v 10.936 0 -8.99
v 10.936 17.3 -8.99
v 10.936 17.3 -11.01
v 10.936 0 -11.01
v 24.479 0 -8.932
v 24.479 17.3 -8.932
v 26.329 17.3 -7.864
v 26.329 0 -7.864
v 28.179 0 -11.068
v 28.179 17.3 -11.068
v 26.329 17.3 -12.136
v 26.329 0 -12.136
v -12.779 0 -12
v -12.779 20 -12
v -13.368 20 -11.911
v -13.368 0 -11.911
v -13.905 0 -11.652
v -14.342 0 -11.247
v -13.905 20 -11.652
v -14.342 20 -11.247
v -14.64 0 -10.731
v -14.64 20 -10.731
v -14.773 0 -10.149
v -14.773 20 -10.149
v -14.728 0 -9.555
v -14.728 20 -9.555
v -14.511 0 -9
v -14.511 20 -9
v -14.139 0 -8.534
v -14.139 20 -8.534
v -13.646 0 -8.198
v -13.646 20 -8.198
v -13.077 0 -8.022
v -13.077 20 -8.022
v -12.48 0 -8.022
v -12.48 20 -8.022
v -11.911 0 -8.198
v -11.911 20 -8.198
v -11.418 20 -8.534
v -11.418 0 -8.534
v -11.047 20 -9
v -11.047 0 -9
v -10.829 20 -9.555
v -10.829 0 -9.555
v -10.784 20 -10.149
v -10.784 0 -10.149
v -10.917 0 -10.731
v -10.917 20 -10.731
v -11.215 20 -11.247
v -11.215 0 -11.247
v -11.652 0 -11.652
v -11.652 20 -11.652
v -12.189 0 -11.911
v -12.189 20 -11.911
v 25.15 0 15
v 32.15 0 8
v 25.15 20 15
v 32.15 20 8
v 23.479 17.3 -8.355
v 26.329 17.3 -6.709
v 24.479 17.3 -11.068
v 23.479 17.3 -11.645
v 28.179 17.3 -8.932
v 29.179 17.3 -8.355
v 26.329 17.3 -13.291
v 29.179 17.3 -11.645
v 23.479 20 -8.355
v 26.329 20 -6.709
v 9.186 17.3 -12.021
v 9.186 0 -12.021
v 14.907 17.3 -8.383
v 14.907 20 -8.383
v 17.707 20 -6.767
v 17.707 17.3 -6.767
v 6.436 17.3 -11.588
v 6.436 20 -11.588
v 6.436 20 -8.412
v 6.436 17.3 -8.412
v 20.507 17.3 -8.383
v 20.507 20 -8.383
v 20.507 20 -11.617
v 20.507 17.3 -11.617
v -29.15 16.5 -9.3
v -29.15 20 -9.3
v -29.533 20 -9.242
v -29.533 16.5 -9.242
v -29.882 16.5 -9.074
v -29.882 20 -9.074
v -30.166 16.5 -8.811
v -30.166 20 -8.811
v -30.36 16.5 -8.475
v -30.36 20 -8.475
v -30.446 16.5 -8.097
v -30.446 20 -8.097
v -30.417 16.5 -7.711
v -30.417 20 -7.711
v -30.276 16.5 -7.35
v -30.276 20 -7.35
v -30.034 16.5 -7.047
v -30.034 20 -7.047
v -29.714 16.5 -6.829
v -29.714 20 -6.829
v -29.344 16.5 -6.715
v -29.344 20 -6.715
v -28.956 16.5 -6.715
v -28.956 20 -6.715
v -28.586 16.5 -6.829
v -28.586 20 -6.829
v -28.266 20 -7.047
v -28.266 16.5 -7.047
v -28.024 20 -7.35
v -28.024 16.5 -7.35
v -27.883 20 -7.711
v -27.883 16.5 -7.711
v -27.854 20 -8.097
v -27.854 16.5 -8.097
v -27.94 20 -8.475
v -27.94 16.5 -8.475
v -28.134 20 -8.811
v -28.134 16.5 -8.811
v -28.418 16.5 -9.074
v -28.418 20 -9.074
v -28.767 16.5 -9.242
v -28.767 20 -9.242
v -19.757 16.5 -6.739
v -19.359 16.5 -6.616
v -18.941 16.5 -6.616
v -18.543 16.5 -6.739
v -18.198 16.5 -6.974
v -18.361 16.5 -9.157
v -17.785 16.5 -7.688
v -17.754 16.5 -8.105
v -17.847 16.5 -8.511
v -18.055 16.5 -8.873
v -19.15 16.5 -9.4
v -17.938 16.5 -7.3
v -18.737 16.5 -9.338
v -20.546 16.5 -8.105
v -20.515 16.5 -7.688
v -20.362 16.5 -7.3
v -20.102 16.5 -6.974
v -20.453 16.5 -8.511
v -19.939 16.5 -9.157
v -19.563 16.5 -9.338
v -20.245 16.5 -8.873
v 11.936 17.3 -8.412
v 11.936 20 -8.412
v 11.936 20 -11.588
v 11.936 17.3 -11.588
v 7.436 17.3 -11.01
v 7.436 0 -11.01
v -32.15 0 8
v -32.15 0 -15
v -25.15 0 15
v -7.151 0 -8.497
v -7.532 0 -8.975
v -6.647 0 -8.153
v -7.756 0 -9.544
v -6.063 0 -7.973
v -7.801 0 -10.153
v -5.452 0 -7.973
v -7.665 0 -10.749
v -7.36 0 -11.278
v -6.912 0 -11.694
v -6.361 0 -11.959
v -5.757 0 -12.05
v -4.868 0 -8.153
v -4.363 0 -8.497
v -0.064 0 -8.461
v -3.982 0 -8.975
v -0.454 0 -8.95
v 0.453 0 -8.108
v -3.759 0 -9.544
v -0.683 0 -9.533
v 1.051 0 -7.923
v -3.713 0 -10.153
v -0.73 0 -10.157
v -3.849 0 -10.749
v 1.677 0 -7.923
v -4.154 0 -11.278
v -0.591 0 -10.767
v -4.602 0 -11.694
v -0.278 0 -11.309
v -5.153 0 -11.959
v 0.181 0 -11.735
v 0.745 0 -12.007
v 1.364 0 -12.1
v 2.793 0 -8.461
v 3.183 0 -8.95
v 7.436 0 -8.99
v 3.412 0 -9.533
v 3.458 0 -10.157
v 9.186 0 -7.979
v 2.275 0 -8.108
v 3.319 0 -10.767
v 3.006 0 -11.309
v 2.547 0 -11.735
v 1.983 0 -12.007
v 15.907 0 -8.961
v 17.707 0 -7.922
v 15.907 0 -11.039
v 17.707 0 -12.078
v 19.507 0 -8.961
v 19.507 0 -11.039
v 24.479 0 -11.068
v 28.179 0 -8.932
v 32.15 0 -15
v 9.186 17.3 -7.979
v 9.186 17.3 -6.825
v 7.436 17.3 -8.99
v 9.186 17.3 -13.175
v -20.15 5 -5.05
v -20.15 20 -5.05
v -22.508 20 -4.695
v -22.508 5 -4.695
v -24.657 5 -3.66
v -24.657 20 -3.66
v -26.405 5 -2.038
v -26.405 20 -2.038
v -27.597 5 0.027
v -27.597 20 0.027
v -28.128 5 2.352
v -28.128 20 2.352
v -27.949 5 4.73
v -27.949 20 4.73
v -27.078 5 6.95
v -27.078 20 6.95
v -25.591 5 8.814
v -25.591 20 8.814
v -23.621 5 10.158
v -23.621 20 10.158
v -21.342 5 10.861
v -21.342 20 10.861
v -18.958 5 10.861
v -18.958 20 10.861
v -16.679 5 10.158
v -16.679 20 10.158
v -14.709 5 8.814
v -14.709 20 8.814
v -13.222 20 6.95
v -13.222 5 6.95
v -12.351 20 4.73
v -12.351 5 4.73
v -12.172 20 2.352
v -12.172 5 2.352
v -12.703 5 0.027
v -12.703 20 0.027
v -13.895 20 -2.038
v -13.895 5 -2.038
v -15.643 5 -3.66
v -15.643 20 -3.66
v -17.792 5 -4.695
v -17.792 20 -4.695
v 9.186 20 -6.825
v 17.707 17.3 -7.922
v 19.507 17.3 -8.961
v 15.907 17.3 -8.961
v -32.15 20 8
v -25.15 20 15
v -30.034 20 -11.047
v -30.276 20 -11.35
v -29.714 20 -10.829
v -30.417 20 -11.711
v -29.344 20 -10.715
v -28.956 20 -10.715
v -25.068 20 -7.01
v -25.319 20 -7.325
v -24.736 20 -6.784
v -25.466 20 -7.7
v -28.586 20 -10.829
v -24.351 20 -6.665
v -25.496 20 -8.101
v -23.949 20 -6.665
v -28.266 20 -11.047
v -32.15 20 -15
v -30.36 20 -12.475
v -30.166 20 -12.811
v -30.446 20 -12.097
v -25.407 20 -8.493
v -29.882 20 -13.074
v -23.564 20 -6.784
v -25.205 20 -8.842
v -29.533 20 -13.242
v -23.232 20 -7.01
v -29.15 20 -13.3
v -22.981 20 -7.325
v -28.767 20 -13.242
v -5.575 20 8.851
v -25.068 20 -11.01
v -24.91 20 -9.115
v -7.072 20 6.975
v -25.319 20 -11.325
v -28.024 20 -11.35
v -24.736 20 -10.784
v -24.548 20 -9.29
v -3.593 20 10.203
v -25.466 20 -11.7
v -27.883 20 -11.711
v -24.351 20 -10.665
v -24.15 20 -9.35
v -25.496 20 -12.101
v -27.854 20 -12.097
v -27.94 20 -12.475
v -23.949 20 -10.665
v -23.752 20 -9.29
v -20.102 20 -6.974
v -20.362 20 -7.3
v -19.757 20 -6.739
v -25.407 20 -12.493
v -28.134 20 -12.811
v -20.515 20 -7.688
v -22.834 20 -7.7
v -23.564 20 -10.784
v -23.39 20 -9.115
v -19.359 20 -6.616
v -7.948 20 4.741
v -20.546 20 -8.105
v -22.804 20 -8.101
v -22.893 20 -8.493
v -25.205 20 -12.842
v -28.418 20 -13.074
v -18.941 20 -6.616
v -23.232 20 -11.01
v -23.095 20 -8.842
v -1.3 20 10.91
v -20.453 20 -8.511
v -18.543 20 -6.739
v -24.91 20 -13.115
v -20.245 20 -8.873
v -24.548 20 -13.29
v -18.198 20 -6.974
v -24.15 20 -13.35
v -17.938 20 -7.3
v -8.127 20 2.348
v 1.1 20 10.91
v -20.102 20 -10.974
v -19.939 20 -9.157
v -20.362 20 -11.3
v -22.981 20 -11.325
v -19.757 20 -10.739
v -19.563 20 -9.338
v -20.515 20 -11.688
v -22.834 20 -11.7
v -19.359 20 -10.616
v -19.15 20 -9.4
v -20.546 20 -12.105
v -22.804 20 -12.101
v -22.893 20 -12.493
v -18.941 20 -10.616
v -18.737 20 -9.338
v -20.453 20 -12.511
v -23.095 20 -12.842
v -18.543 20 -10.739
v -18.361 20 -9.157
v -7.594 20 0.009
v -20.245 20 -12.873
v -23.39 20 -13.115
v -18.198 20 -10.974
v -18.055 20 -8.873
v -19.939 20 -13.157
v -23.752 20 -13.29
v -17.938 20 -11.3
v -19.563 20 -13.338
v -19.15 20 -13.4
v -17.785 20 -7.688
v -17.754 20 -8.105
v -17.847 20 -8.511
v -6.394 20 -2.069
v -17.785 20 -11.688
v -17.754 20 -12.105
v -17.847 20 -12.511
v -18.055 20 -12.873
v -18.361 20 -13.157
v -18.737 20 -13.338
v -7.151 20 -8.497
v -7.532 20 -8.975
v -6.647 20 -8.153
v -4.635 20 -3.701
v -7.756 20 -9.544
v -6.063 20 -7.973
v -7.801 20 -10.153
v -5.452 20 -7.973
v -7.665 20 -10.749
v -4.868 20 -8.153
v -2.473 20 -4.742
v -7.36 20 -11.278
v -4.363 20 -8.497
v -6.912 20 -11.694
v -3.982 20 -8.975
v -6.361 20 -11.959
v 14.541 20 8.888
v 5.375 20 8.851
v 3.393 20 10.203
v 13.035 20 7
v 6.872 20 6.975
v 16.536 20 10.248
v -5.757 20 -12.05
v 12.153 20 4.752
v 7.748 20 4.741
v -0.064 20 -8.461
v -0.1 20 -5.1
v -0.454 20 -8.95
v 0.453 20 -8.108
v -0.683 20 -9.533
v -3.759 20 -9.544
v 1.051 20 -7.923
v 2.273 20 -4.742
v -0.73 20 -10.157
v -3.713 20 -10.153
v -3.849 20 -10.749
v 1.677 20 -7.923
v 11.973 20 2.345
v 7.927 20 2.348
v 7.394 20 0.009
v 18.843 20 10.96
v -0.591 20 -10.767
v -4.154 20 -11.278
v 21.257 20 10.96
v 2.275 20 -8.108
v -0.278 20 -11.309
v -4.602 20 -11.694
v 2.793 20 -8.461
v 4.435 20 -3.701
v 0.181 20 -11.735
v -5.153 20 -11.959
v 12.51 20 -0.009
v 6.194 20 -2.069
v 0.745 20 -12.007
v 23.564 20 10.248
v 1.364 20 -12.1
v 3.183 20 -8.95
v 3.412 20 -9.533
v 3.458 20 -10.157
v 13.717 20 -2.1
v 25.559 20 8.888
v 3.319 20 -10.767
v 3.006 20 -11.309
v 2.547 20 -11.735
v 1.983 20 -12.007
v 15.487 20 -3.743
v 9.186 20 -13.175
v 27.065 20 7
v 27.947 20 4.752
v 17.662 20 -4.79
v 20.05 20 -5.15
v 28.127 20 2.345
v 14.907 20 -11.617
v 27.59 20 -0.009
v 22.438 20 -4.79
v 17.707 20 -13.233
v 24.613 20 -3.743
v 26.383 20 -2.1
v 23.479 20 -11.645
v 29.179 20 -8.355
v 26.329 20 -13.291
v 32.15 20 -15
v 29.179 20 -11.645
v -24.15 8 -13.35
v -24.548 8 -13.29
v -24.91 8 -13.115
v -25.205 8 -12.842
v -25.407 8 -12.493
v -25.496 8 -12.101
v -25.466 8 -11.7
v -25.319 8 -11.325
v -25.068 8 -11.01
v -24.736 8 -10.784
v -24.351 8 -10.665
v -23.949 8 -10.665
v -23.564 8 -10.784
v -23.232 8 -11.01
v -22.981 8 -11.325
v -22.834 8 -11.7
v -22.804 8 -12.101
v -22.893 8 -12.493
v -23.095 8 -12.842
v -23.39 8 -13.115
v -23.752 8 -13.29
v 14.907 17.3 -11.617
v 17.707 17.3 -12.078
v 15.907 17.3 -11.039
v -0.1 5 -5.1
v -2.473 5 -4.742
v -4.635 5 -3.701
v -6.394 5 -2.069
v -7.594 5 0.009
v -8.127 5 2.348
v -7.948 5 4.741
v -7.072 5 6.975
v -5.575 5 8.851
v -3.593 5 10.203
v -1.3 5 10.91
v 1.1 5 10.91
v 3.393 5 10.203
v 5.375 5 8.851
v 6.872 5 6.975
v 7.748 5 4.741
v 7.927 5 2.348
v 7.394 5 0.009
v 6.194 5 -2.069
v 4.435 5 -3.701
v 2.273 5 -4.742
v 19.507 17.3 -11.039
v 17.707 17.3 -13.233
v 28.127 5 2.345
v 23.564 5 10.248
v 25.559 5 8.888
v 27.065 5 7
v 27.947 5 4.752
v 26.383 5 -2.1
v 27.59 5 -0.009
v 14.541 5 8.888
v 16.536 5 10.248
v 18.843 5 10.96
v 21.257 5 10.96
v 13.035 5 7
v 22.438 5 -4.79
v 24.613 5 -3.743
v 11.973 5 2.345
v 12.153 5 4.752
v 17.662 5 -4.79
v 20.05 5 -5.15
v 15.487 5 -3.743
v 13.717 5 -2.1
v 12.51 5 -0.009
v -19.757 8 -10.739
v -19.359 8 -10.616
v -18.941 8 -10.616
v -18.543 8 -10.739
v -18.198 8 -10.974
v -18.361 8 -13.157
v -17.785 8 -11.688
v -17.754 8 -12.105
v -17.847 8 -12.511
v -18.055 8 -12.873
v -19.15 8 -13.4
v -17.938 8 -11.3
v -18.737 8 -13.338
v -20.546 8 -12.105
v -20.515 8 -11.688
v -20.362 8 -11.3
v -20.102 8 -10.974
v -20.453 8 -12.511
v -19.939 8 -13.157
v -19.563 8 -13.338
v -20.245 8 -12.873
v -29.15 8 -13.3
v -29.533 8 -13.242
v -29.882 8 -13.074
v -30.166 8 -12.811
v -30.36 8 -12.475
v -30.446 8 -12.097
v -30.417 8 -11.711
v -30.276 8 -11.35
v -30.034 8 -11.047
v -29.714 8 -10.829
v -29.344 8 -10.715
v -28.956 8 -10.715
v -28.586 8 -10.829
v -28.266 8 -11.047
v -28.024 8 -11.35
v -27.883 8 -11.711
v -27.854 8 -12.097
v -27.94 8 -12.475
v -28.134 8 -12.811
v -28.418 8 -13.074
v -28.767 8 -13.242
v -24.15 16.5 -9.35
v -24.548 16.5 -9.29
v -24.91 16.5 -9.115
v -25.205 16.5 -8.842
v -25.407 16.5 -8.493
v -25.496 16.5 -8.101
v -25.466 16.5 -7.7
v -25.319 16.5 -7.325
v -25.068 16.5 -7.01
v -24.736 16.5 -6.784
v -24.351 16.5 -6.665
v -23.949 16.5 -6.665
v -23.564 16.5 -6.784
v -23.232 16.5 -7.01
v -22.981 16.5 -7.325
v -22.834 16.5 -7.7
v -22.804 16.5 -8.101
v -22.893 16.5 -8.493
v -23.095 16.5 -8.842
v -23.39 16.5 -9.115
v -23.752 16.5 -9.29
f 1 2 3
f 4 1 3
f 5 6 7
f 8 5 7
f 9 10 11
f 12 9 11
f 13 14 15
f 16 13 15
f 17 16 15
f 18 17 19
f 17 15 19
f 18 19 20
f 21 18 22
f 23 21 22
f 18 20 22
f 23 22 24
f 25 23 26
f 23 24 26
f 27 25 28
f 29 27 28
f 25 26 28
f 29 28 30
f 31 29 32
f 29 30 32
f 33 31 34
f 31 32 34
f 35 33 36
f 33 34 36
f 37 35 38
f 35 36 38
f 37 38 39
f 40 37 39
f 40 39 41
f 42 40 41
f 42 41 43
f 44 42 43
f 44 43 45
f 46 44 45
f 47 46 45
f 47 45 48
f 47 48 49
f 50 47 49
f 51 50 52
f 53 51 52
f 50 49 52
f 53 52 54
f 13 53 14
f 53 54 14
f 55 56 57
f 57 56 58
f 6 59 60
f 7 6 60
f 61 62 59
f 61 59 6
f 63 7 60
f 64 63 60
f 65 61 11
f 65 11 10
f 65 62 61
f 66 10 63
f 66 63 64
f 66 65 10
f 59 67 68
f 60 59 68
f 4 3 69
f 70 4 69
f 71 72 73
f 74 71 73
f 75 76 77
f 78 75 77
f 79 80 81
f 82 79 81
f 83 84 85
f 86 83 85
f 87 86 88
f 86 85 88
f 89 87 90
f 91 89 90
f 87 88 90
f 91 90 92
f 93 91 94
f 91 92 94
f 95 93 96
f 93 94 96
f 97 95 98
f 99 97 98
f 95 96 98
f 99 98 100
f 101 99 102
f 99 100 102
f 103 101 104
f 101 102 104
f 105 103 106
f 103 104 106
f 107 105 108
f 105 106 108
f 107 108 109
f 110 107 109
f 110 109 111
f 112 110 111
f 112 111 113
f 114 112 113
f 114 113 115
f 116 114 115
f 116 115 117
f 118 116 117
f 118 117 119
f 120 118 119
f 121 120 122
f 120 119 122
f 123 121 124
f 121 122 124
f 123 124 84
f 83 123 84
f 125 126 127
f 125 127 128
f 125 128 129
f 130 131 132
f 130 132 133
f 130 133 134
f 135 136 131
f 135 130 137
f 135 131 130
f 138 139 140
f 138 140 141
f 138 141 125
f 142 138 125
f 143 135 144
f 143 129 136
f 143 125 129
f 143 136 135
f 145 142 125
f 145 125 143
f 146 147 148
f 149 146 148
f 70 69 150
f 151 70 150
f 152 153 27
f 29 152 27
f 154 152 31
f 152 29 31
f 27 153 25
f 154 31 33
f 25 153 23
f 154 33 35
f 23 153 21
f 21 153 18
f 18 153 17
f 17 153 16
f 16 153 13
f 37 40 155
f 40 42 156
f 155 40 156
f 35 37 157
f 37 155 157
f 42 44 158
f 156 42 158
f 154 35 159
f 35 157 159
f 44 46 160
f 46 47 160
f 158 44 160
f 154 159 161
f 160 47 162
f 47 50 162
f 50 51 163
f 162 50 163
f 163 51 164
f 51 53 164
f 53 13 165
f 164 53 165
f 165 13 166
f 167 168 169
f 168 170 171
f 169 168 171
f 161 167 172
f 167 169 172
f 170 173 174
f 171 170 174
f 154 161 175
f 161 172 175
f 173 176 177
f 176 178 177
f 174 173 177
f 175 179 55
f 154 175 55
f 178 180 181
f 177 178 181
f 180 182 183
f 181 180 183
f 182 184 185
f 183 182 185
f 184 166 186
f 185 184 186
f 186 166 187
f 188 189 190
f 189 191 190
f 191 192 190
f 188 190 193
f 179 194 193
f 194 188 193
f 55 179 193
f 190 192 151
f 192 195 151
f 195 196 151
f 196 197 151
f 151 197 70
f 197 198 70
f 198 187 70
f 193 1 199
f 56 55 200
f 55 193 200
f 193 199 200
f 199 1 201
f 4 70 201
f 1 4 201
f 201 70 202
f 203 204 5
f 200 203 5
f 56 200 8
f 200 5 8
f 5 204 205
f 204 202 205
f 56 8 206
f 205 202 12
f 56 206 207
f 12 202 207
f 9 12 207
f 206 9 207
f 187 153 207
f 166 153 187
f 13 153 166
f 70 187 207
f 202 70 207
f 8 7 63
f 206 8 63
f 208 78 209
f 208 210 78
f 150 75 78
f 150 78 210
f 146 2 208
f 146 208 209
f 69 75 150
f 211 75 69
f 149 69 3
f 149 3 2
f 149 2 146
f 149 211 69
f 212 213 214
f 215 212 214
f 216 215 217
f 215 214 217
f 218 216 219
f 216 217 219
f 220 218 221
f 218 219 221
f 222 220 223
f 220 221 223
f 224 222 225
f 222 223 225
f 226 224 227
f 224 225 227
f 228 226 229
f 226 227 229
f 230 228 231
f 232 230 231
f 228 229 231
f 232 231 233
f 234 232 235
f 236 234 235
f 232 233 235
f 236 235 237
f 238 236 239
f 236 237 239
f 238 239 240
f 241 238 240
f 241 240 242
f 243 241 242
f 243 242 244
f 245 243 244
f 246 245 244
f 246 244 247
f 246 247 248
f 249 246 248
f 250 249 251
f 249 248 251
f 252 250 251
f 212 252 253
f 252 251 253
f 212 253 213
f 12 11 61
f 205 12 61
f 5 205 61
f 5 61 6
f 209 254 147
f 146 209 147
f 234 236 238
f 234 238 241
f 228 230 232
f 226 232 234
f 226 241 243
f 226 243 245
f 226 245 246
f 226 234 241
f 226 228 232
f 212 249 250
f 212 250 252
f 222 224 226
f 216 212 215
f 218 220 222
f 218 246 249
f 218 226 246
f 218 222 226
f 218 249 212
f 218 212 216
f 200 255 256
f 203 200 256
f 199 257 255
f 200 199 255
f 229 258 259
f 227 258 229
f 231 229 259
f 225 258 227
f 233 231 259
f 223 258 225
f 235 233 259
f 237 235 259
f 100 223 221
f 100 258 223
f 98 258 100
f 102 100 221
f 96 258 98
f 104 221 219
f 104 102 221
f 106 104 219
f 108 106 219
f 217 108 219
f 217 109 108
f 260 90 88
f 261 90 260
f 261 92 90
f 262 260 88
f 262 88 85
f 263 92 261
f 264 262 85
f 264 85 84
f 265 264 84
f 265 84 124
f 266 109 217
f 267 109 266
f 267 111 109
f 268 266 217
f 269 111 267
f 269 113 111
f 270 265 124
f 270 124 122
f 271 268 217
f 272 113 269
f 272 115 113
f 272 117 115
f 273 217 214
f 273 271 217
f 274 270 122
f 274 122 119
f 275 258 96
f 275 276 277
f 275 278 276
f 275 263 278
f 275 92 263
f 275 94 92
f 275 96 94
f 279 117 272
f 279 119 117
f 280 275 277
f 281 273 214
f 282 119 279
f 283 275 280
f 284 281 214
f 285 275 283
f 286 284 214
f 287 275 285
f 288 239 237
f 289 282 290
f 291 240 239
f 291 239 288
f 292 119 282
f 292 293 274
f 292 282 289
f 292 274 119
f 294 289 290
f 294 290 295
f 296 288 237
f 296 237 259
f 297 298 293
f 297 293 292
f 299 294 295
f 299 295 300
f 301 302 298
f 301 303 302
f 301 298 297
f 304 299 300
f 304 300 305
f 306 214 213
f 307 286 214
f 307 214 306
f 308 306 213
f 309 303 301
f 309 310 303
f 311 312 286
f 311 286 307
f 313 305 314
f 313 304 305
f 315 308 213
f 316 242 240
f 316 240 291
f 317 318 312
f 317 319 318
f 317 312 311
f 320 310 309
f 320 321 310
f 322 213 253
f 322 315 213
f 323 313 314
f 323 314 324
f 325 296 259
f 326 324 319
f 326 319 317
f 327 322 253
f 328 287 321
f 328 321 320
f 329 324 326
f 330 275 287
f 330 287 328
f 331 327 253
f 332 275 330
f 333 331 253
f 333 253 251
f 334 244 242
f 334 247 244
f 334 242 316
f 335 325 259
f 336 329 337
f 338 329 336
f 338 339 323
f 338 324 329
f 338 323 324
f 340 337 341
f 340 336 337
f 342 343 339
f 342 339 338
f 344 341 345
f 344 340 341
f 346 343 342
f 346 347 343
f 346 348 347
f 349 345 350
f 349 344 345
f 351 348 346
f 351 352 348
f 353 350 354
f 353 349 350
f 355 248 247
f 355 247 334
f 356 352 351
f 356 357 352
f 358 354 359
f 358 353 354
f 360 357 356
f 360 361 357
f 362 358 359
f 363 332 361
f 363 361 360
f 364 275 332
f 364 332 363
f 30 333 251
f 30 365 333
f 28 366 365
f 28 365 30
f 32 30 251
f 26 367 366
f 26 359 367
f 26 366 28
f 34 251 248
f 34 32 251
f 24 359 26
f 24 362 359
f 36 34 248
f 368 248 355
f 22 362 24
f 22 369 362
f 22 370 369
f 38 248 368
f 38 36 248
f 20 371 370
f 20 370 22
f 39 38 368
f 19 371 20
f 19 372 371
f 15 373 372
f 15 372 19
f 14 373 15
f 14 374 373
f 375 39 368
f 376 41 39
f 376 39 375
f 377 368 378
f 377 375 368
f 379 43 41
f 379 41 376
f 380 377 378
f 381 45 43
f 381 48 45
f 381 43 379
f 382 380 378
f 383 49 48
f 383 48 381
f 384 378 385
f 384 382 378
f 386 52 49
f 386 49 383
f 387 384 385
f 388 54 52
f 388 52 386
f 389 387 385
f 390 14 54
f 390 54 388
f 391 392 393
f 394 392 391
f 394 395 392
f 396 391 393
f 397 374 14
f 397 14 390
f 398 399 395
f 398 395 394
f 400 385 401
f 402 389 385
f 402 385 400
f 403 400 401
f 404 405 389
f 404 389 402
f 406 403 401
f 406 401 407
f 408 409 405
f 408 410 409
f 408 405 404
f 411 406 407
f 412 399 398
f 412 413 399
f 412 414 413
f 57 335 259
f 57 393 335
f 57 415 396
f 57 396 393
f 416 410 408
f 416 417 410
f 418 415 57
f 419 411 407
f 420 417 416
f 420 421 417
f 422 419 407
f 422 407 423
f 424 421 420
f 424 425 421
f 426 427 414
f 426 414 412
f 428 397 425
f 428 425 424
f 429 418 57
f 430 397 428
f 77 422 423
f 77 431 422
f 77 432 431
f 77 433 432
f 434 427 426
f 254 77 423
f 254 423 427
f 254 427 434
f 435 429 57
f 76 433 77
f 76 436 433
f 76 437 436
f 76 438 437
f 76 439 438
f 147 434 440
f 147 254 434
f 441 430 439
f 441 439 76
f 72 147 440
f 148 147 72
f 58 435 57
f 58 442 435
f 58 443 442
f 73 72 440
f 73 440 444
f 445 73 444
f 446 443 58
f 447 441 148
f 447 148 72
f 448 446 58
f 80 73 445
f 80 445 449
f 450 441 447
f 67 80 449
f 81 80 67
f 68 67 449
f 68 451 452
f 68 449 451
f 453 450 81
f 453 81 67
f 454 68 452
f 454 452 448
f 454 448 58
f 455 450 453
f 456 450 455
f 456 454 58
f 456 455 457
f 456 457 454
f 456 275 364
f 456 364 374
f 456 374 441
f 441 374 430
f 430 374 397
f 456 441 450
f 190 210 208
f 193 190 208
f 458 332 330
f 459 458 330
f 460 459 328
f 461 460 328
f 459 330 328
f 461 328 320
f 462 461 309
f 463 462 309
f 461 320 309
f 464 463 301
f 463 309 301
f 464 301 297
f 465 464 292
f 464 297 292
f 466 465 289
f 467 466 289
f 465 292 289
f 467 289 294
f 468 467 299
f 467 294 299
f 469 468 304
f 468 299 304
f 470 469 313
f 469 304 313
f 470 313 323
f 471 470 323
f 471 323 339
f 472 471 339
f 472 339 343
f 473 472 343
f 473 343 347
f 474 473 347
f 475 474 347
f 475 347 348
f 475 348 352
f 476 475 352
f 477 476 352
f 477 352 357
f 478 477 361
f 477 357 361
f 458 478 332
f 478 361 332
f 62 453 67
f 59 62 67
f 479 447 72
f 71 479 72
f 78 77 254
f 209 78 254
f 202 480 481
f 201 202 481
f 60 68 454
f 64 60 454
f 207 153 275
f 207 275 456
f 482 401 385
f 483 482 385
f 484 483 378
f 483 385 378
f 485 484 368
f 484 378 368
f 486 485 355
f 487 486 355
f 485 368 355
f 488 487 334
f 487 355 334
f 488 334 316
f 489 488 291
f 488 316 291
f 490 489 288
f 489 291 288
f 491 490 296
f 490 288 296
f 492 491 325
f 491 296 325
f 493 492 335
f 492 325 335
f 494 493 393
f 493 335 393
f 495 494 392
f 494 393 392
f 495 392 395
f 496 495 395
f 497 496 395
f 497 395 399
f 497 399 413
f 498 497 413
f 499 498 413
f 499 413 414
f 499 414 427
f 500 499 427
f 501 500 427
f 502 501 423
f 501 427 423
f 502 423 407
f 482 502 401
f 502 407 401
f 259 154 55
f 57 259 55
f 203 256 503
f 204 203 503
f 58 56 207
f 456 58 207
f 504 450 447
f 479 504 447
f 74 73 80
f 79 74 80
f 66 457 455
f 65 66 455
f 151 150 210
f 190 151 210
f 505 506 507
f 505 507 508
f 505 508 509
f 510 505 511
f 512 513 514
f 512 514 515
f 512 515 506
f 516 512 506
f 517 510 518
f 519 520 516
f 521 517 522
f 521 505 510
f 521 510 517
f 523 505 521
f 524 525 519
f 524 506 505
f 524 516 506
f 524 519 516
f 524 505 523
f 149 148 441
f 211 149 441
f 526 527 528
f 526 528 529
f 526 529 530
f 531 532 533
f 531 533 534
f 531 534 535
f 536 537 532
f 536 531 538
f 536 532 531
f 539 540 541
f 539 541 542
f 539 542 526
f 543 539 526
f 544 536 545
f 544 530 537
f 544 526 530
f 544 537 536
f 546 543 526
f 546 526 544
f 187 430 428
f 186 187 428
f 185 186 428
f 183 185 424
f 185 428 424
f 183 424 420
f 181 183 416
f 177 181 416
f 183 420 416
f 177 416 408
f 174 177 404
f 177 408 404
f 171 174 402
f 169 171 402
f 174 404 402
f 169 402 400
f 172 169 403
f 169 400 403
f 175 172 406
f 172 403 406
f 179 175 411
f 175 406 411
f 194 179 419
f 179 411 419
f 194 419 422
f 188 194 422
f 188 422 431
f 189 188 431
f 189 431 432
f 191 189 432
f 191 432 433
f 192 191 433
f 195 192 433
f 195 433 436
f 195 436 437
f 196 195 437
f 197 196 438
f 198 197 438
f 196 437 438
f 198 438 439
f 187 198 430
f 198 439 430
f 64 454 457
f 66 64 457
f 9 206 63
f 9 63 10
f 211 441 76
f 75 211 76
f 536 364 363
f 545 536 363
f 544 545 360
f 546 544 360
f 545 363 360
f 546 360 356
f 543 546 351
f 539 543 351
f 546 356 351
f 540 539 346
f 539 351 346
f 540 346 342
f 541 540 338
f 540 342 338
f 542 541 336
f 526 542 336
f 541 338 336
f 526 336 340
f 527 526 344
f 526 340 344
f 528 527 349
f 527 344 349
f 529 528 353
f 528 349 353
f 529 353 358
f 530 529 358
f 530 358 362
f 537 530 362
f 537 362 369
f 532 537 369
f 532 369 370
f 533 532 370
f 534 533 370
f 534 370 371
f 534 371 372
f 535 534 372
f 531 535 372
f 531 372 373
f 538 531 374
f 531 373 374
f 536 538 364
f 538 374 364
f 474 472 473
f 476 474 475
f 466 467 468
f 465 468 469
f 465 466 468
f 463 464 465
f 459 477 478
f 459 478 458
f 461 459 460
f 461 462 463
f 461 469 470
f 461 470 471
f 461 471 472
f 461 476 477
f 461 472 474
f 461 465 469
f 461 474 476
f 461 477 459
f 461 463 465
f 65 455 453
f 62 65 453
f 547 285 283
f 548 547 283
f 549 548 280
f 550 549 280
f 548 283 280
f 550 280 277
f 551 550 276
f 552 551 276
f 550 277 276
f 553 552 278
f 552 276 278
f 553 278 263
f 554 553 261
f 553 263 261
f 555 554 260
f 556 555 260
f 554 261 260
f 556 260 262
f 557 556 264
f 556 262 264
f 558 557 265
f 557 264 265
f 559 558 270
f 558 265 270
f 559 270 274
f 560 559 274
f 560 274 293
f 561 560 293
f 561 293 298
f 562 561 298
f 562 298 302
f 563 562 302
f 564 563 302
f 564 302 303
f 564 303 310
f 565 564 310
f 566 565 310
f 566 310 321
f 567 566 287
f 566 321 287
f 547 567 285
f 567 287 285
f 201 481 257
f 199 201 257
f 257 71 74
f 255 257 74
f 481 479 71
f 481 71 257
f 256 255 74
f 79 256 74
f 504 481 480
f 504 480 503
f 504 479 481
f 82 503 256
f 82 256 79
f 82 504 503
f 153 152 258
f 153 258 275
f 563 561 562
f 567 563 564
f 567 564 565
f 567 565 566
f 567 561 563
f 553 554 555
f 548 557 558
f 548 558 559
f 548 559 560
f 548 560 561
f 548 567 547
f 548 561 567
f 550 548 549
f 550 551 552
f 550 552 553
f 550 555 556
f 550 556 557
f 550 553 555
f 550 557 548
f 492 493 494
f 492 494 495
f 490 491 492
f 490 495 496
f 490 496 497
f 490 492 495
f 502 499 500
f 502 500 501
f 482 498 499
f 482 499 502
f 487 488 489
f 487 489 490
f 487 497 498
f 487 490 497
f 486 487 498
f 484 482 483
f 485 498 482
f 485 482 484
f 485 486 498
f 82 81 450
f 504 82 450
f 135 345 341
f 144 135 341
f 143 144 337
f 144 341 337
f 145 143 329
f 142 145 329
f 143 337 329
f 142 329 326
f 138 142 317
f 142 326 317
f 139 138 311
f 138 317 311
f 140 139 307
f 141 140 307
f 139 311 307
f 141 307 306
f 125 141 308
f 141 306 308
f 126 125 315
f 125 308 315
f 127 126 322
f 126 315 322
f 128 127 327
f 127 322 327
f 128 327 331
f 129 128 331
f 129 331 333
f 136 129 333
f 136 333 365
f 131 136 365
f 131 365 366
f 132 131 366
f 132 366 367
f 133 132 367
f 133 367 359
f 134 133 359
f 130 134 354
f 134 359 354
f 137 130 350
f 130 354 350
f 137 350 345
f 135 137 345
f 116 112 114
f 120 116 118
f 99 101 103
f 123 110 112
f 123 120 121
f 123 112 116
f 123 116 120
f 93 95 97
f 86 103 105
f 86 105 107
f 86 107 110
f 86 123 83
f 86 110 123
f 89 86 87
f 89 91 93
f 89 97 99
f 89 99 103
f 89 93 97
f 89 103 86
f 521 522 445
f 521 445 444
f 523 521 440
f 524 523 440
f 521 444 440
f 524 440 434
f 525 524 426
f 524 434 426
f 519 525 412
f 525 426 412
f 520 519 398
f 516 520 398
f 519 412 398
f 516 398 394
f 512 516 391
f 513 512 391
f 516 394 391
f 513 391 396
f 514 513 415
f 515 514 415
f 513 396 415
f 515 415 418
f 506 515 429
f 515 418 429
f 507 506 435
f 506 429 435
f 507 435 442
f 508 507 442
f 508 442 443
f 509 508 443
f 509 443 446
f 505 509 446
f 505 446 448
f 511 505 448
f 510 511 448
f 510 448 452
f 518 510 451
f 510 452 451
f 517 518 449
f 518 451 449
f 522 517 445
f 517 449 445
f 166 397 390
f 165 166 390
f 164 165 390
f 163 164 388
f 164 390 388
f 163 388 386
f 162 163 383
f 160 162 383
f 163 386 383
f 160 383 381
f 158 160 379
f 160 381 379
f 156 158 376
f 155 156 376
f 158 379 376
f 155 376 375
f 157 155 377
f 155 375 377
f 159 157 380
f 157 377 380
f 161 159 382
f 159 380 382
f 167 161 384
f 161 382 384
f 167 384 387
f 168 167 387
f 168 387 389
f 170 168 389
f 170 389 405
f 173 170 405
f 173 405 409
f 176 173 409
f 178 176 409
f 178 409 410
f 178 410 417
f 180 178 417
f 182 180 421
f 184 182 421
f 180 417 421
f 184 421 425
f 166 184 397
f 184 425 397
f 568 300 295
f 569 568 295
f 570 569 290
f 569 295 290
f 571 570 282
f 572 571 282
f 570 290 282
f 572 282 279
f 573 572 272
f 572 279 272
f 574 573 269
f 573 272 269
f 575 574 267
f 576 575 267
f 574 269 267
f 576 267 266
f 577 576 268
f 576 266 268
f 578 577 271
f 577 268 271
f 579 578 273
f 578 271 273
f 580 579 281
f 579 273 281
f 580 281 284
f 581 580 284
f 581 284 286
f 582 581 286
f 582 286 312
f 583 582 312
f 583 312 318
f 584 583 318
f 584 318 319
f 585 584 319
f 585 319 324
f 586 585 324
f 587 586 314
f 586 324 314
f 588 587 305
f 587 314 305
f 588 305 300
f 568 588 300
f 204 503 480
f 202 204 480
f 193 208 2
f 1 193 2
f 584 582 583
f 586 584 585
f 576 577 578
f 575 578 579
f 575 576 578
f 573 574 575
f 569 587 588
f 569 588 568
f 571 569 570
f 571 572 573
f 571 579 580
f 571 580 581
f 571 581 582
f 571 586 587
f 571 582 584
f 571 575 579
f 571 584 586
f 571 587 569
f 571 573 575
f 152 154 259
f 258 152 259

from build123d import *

# Parameters (mm, degrees)
SKETCH1_W             = 64.3
SKETCH1_H             = 30
BOSS_EXTRUDE1_DEPTH   = 20
VARILLAS_START        = 20
SKETCH1_3_R           = 8.05
SKETCH1_3_R_2         = 8.1
SKETCH1_3_R_3         = 8
VARILLAS_HUECAS_DEPTH = 15
TORNILLOS_START       = 20
SKETCH1_4_R           = 1.35
SKETCH1_4_R_2         = 1.4
SKETCH1_4_R_3         = 1.3
TORNILLOS_ALEM_DEPTH  = 12
TORNILLOS_PCB_DEPTH   = 2.7
SKETCH1_5_R           = 2
SKETCH1_5_R_2         = 2.05
SKETCH1_5_R_3         = 2.1
VARILLAS_SERVOS_DEPTH = 20
CHAMFER1_SIZE         = 7
CUT_EXTRUDE5_REACH    = 41.47
CUT_EXTRUDE6_START    = 20
SKETCH1_7_R           = 1.35
SKETCH1_7_R_2         = 1.3
SKETCH1_7_R_3         = 1.4
CUT_EXTRUDE6_DEPTH    = 3.5


with BuildPart() as part:
    # Sketch1 → Boss-Extrude1 (new body)
    with BuildSketch(Plane(origin=(0, 0, 0), x_dir=(1, 0, 0), z_dir=(0, 1, 0))):
        Rectangle(SKETCH1_W, SKETCH1_H)
    extrude(amount=BOSS_EXTRUDE1_DEPTH)

    # Sketch1<3> → Varillas huecas (cut)
    with BuildSketch(Plane(origin=(0, 0, 0), x_dir=(1, 0, 0), z_dir=(0, 1, 0)).offset(VARILLAS_START)):
        with Locations(Location((-0.1, -2.95, 0), (0, 0, 90))):
            Circle(SKETCH1_3_R)
        with Locations(Location((20.05, -2.95, 0), (0, 0, 90))):
            Circle(SKETCH1_3_R_2)
        with Locations(Location((-20.15, -2.95, 0), (0, 0, 90))):
            Circle(SKETCH1_3_R_3)
    extrude(amount=-VARILLAS_HUECAS_DEPTH, mode=Mode.SUBTRACT)

    # Sketch1<4> → Tornillos Alem (cut)
    with BuildSketch(Plane(origin=(0, 0, 0), x_dir=(1, 0, 0), z_dir=(0, 1, 0)).offset(TORNILLOS_START)):
        with Locations(Location((-24.15, 12, 0), (0, 0, 90))):
            Circle(SKETCH1_4_R)
        with Locations(Location((-19.15, 12, 0), (0, 0, 90))):
            Circle(SKETCH1_4_R_2)
        with Locations(Location((-29.15, 12, 0), (0, 0, 90))):
            Circle(SKETCH1_4_R_3)
    extrude(amount=-TORNILLOS_ALEM_DEPTH, mode=Mode.SUBTRACT)

    # Sketch1<6> → Tornillos PCB (cut)
    with BuildSketch(Plane(origin=(0, 0, 0), x_dir=(1, 0, 0), z_dir=(0, 1, 0)).offset(TORNILLOS_START)):
        Polygon((9.185714286, 6.824573519), (11.935714286, 8.41228676), (11.935714286, 11.58771324), (9.185714286, 13.175426481), (6.435714286, 11.58771324), (6.435714286, 8.41228676), align=None)
        Polygon((17.707142857, 6.766838493), (20.507142857, 8.383419246), (20.507142857, 11.616580754), (17.707142857, 13.233161507), (14.907142857, 11.616580754), (14.907142857, 8.383419246), align=None)
        Polygon((26.328571429, 6.709103466), (29.178571429, 8.354551733), (29.178571429, 11.645448267), (26.328571429, 13.290896534), (23.478571429, 11.645448267), (23.478571429, 8.354551733), align=None)
    extrude(amount=-TORNILLOS_PCB_DEPTH, mode=Mode.SUBTRACT)

    # Sketch1<5> → Varillas servos (cut)
    with BuildSketch(Plane(origin=(0, 0, 0), x_dir=(1, 0, 0), z_dir=(0, 1, 0)).offset(VARILLAS_START)):
        with Locations(Location((-12.778571429, 10, 0), (0, 0, 90))):
            Circle(SKETCH1_5_R)
        with Locations(Location((-5.757142857, 10, 0), (0, 0, 90))):
            Circle(SKETCH1_5_R_2)
        with Locations(Location((1.364285714, 10, 0), (0, 0, 90))):
            Circle(SKETCH1_5_R_3)
    extrude(amount=-VARILLAS_SERVOS_DEPTH, mode=Mode.SUBTRACT)

    # Chamfer1
    chamfer1_edges = [part.edges().sort_by_distance(p)[0] for p in [
        (-32.15, 10, 15),
        (32.15, 10, 15),
    ]]
    chamfer(chamfer1_edges, length=CHAMFER1_SIZE)

    # Sketch2 → Cut-Extrude5 (cut, up to next)
    with BuildSketch(Plane(origin=(0, 17.3, 0), x_dir=(1, 0, 0), z_dir=(0, 1, 0)), mode=Mode.PRIVATE) as cut_extrude5_sk1:
        Polygon((24.478571429, 11.068097998), (24.478571429, 8.931902002), (26.328571429, 7.863804004), (28.178571429, 8.931902002), (28.178571429, 11.068097998), (26.328571429, 12.136195996), align=None)
    cut_extrude5_tool1 = extrude(cut_extrude5_sk1.sketch, amount=-CUT_EXTRUDE5_REACH, mode=Mode.PRIVATE) & part.part
    # Sketch2 → Cut-Extrude5 (cut, up to next)
    with BuildSketch(Plane(origin=(0, 17.3, 0), x_dir=(1, 0, 0), z_dir=(0, 1, 0)), mode=Mode.PRIVATE) as cut_extrude5_sk2:
        Polygon((15.907142857, 11.039230485), (15.907142857, 8.960769515), (17.707142857, 7.921539031), (19.507142857, 8.960769515), (19.507142857, 11.039230485), (17.707142857, 12.078460969), align=None)
    cut_extrude5_tool2 = extrude(cut_extrude5_sk2.sketch, amount=-CUT_EXTRUDE5_REACH, mode=Mode.PRIVATE) & part.part
    # Sketch2 → Cut-Extrude5 (cut, up to next)
    with BuildSketch(Plane(origin=(0, 17.3, 0), x_dir=(1, 0, 0), z_dir=(0, 1, 0)), mode=Mode.PRIVATE) as cut_extrude5_sk3:
        Polygon((10.935714286, 11.010362971), (9.185714286, 12.020725942), (7.435714286, 11.010362971), (7.435714286, 8.989637029), (9.185714286, 7.979274058), (10.935714286, 8.989637029), align=None)
    cut_extrude5_tool3 = extrude(cut_extrude5_sk3.sketch, amount=-CUT_EXTRUDE5_REACH, mode=Mode.PRIVATE) & part.part
    add(cut_extrude5_tool1.solids().sort_by_distance((26.328571, 17.3, -10))[0], mode=Mode.SUBTRACT)
    add(cut_extrude5_tool2.solids().sort_by_distance((17.707143, 17.3, -10))[0], mode=Mode.SUBTRACT)
    add(cut_extrude5_tool3.solids().sort_by_distance((9.185714, 17.3, -10))[0], mode=Mode.SUBTRACT)

    # Sketch1<7> → Cut-Extrude6 (cut)
    with BuildSketch(Plane(origin=(0, 0, 0), x_dir=(1, 0, 0), z_dir=(0, 1, 0)).offset(CUT_EXTRUDE6_START)):
        with Locations(Location((-24.15, 8, 0), (0, 0, 90))):
            Circle(SKETCH1_7_R)
        with Locations(Location((-29.15, 8, 0), (0, 0, 90))):
            Circle(SKETCH1_7_R_2)
        with Locations(Location((-19.15, 8, 0), (0, 0, 90))):
            Circle(SKETCH1_7_R_3)
    extrude(amount=-CUT_EXTRUDE6_DEPTH, mode=Mode.SUBTRACT)


solid = part.part
